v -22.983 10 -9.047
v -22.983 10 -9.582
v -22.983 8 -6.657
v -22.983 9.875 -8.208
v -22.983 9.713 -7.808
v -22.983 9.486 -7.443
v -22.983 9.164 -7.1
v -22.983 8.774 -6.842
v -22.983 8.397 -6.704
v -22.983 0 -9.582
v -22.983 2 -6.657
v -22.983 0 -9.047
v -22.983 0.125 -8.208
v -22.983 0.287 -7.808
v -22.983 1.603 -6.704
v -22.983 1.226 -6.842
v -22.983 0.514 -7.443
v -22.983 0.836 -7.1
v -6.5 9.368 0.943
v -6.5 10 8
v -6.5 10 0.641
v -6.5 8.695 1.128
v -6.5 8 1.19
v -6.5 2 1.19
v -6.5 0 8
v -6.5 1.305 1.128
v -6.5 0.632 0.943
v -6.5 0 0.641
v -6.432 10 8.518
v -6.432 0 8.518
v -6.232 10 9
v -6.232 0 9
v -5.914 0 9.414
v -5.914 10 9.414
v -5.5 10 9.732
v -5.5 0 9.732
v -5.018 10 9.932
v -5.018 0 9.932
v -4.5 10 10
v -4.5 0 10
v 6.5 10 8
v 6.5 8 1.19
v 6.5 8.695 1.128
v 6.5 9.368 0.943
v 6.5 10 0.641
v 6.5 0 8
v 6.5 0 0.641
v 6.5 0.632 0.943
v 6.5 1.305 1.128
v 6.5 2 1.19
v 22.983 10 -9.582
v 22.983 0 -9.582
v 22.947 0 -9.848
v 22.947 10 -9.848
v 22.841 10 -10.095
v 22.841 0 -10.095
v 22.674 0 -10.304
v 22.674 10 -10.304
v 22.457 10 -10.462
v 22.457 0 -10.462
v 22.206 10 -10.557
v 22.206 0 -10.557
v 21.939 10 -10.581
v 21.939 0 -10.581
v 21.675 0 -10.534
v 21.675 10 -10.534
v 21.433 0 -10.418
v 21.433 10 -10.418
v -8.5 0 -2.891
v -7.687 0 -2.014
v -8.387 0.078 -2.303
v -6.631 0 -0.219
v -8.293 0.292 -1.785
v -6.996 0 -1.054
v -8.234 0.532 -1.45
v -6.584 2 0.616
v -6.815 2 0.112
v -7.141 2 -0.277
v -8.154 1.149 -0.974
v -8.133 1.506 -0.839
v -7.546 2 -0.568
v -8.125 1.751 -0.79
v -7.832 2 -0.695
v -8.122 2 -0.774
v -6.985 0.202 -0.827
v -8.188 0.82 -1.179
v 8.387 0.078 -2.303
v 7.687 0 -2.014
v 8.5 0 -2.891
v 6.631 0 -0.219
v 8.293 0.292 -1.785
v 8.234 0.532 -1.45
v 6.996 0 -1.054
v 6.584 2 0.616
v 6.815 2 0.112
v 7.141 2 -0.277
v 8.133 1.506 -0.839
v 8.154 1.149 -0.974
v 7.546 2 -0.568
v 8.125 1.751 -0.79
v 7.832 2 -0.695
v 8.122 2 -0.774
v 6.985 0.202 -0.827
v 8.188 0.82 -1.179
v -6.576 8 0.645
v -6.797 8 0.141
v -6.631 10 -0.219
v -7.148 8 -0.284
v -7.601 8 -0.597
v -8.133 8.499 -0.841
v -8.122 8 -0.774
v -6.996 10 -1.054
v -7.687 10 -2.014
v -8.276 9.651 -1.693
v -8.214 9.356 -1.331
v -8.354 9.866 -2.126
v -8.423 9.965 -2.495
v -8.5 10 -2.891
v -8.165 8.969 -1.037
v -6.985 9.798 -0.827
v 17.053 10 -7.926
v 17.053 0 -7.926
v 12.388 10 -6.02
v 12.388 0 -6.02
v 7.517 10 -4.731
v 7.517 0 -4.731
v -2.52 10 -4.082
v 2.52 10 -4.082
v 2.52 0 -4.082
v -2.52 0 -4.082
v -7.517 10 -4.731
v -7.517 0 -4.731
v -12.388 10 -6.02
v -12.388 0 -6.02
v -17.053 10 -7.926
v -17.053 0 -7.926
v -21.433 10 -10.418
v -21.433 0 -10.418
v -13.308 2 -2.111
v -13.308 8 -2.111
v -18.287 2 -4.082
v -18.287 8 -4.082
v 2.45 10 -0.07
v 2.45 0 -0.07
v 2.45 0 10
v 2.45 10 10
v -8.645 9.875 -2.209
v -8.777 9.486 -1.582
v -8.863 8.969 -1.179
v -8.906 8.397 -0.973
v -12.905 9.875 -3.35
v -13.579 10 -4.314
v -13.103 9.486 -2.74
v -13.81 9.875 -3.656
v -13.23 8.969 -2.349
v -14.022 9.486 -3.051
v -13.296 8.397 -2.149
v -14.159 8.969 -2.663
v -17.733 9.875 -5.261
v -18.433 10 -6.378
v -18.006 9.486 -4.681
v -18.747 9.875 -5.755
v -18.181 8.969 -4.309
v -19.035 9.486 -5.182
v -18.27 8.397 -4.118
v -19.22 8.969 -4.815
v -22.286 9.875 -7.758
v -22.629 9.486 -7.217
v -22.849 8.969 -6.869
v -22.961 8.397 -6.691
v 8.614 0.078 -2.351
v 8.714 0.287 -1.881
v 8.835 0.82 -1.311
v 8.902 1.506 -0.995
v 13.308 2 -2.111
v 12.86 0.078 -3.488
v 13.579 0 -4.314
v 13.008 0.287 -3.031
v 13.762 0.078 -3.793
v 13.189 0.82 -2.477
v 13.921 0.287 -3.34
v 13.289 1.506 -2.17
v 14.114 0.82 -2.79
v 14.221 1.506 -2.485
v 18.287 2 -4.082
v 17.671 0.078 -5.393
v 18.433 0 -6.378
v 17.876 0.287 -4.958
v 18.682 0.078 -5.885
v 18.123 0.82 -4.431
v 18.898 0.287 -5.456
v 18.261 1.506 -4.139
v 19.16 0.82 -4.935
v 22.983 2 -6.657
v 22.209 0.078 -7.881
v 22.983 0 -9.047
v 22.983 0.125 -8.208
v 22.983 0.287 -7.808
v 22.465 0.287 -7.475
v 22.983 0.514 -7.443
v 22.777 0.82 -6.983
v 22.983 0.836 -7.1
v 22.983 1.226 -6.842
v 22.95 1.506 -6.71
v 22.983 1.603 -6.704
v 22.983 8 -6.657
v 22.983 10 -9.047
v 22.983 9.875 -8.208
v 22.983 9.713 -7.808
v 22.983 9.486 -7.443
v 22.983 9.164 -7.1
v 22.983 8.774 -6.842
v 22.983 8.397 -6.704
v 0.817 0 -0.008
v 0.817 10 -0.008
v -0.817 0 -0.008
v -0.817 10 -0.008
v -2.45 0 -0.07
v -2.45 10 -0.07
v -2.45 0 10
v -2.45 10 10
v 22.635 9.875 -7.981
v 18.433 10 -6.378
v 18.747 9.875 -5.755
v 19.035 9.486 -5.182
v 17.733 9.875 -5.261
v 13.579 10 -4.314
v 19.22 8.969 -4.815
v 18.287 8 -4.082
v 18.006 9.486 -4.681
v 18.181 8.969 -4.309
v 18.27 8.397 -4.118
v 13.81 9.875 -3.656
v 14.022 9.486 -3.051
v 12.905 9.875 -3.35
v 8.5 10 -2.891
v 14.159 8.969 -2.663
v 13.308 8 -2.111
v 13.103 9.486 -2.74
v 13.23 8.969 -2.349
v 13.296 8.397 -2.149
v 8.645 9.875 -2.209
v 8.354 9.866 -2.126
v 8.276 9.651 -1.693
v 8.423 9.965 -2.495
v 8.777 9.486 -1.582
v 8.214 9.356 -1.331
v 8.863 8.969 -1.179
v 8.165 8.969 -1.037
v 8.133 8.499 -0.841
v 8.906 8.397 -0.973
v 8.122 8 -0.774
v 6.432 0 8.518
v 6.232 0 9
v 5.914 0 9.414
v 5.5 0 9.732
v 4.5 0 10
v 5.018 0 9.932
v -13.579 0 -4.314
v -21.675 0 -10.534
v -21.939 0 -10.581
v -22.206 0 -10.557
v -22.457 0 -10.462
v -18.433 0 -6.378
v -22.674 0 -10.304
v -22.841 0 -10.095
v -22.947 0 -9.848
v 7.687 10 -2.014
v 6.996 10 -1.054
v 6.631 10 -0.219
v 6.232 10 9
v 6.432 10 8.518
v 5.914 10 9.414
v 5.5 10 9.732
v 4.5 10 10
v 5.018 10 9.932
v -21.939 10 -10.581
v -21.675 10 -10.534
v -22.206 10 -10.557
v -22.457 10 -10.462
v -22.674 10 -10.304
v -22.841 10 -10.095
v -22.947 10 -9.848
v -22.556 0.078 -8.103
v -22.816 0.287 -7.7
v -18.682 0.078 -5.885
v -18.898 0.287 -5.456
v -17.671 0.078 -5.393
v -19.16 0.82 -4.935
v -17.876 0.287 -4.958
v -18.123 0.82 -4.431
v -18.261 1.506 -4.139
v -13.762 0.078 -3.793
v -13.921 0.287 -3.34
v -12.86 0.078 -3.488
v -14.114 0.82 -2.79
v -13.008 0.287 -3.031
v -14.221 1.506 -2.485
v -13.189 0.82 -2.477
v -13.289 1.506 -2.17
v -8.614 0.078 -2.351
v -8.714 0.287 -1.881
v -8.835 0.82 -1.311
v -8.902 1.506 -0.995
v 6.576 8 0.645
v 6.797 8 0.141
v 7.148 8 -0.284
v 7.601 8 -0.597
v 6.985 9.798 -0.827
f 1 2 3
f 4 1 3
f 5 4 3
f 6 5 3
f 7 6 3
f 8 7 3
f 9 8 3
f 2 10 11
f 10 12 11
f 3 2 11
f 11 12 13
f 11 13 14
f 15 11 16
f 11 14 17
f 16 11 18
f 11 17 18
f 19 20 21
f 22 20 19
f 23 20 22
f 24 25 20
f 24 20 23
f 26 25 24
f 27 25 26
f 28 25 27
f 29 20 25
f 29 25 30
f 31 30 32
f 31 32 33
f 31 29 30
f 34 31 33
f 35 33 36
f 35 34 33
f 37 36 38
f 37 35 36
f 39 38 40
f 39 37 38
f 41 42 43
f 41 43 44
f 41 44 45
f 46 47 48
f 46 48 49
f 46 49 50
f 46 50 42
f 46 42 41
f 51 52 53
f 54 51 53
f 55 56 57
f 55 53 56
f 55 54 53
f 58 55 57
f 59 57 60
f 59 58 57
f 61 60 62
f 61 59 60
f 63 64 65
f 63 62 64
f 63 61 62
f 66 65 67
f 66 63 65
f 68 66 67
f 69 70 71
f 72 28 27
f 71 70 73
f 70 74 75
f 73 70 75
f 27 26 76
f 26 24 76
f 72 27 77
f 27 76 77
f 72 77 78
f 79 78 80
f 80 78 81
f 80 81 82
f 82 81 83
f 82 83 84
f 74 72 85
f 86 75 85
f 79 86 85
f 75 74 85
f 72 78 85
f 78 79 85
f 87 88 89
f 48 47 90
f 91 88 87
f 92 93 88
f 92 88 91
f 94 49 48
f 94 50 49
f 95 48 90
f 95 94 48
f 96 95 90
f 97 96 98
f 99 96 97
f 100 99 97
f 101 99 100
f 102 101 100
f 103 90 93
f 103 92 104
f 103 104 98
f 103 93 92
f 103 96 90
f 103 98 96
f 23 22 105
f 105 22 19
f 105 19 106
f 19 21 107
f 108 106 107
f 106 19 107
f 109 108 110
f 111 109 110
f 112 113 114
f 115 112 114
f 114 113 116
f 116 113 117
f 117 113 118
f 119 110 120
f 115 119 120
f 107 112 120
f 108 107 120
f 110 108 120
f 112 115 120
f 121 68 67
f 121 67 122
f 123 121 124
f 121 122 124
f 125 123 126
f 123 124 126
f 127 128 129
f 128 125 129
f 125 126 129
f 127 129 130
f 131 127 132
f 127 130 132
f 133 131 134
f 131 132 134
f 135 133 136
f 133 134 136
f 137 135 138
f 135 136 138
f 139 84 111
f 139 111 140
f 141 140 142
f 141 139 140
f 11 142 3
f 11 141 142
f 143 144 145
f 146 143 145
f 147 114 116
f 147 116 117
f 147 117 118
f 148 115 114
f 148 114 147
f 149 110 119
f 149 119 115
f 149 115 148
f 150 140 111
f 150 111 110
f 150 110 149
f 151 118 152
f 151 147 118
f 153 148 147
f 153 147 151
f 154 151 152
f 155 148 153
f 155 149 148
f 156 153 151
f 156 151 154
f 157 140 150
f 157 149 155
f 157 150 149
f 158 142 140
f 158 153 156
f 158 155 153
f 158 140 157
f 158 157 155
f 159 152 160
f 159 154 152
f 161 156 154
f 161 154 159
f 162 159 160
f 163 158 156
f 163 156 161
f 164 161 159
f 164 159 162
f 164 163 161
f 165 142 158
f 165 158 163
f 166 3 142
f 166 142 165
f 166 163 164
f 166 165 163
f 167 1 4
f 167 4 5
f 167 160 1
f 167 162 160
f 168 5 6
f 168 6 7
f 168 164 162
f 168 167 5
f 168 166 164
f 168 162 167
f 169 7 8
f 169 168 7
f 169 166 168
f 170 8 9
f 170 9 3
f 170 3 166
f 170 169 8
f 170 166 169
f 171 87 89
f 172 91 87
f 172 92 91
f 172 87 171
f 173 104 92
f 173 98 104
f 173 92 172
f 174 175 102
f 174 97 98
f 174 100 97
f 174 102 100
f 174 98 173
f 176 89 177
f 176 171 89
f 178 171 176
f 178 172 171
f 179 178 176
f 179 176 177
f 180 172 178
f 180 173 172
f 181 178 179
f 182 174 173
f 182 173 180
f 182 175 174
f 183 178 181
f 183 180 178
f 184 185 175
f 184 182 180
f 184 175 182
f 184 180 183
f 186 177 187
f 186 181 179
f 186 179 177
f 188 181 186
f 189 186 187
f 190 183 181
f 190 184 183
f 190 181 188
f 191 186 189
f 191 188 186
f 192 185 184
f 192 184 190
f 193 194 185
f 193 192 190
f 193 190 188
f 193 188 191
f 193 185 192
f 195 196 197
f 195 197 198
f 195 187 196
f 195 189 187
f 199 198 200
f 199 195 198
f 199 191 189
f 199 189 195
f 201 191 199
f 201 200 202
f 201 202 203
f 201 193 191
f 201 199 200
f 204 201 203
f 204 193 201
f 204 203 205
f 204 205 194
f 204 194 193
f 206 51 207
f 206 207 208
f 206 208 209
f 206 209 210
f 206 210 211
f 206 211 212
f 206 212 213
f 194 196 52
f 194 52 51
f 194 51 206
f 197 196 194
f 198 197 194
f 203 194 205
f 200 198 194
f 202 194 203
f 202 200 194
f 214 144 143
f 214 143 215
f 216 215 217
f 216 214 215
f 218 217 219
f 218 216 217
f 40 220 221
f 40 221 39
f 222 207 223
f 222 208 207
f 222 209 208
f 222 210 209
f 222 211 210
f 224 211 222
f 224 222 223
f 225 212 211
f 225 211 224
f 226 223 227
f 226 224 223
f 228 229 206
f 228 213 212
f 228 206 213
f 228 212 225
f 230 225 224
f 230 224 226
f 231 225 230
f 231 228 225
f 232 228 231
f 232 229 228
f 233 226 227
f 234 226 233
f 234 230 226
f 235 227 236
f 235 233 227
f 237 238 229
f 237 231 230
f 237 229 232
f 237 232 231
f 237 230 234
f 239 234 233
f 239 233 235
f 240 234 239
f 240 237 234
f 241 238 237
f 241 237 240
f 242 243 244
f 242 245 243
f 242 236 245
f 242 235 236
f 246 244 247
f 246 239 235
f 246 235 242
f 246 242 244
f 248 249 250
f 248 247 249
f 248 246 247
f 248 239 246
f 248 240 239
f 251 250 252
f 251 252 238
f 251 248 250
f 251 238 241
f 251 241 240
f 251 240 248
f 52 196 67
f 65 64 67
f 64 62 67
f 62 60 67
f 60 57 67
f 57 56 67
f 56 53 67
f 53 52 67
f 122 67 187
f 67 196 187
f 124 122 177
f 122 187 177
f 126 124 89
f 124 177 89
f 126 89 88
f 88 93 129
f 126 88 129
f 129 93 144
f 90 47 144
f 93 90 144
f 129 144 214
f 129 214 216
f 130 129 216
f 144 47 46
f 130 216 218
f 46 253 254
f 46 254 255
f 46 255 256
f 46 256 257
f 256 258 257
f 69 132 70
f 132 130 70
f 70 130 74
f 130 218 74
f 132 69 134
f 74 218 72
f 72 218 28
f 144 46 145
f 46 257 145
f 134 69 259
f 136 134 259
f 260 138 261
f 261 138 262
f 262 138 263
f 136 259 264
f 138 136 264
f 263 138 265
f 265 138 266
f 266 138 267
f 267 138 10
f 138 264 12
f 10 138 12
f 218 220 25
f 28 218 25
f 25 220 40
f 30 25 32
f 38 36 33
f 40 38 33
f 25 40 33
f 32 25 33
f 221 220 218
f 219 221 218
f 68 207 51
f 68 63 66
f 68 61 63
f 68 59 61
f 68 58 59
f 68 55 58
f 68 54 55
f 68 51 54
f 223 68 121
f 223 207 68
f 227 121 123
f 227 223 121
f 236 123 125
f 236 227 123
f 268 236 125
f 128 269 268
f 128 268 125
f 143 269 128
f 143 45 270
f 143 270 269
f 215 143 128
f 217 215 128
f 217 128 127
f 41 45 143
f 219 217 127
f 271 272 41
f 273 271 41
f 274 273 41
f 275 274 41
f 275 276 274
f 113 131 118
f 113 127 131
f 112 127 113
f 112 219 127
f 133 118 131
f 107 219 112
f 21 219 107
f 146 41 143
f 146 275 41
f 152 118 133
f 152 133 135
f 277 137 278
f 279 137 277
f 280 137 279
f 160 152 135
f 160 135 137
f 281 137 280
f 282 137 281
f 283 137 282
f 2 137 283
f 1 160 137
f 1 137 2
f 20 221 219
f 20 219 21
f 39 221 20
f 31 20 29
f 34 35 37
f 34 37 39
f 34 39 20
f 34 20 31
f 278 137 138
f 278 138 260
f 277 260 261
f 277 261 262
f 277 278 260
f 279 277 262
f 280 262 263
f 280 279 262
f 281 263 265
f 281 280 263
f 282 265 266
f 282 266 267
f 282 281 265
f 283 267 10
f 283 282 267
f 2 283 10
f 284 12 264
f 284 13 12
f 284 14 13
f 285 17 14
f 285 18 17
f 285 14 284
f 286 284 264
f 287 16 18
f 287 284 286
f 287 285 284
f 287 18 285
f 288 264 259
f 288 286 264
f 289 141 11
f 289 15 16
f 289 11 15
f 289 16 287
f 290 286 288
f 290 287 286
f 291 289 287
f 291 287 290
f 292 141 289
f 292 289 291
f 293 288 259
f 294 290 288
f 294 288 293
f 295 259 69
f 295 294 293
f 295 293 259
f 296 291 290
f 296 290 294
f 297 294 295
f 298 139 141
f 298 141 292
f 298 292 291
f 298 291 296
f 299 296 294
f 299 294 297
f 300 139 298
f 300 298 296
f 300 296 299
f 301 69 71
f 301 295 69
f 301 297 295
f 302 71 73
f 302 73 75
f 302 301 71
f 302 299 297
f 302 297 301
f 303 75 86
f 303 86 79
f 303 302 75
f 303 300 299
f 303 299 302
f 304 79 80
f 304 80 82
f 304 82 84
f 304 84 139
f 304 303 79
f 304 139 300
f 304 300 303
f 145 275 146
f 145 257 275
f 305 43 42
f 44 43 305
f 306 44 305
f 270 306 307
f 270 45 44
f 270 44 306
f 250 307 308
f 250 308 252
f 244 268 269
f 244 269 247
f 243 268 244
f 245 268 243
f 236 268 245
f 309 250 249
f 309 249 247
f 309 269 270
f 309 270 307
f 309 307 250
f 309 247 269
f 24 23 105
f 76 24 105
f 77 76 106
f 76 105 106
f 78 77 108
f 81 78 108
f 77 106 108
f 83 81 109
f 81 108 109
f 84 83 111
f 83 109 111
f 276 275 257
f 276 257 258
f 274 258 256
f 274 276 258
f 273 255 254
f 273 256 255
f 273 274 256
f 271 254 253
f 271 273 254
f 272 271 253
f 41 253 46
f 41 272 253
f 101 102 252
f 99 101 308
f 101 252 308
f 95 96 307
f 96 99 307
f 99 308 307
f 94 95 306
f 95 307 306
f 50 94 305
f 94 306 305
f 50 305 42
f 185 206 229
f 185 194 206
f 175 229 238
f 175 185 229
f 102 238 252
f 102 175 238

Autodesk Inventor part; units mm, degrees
ref_plane "YZ Plane" through (0, 0, 0) normal (1, 0, 0) x (0, 1, 0)
ref_plane "XZ Plane" through (0, 0, 0) normal (0, 1, 0) x (-1, 0, 0)
sketch "스케치1" plane through (0, 0, 0) normal (0, 1, 0) x (-1, 0, 0)
  line L0 (-6.5, -10) -> (-6.5, 10)
  line L1 (6.5, 10) -> (6.5, -10)
  line L2 (6.5, -10) -> (-6.5, 10) construction
  line L3 (-6.5, -10) -> (6.5, 10) construction
  line L4 (2.45, -10) -> (-2.45, -10)
  line L5 (-2.45, -10) -> (-2.45, 10)
  line L6 (-2.45, 10) -> (2.45, 10)
  line L7 (2.45, 10) -> (2.45, -10)
  line L8 (2.45, -10) -> (-2.45, 10) construction
  line L9 (-2.45, -10) -> (2.45, 10) construction
  arc A0 (22.9827, -6.6573) -> (-22.9827, -6.6573) centre (0, -43) ccw
  arc A1 (22.9827, -11.4914) -> (-22.9827, -11.4914) centre (0, -43) ccw
  line L10 (22.9827, -11.4914) -> (22.9827, -6.6573)
  line L11 (-22.9827, -11.4914) -> (-22.9827, -6.6573)
  line L12 (-6.5, 10) -> (-2.45, 10)
  line L13 (2.45, 10) -> (6.5, 10)
  line L14 (6.5, -10) -> (2.45, -10)
  line L15 (-2.45, -10) -> (-6.5, -10)
  point P0 (0, 0)
  point P1 (6.5, -0.4941)
  point P2 (2.45, -0.0699)
  point P3 (-2.45, -0.0699)
  point P4 (-6.5, -0.4941)
  dimension "d0" = 13
  dimension "d1" = 20
  dimension "d2" = 4.9
  dimension "d3" = 86
  dimension "d4" = 4
sketch "스케치2" plane through (0, 0, 0) normal (0, 0, 1) x (1, 0, 0)
  point P0 (0, 0)
ref_plane "작업 평면1" through (0, 0, -43) normal (0, 0, 1) x (1, 0, 0)
sketch "스케치3" plane through (0, 0, -43) normal (0, 0, 1) x (1, 0, 0)
  line L0 (0, 0) -> (-26.5437, 0)
  line L1 (-26.5437, 0) -> (31.7273, 0)
extrude "돌출1" add sketch "스케치1" along normal blind 10 contours A1 L11 A0 L0 | L0 A0 L5 A1 | L0 L12 L5 A0 | L5 A0 L7 A1 | L7 A0 L1 A1 | L7 L13 L1 A0 | L1 A0 L10 A1
fillet "모깎기2" radius 1 2 edges at (22.9827, 5, -11.4914) (-22.9827, 5, -11.4914)
fillet "모깎기3" radius 2 6 edges at (-15.06, 0, -2.7235) (15.06, 0, -2.7235) (15.06, 10, -2.7235) (-15.06, 10, -2.7235) (6.5, 5, 10) (-6.5, 5, 10)
fillet "모깎기4" radius 2 2 edges at (-6.5, 5, -0.4941) (6.5, 5, -0.4941)
properties part number "날개꼽는파트"
